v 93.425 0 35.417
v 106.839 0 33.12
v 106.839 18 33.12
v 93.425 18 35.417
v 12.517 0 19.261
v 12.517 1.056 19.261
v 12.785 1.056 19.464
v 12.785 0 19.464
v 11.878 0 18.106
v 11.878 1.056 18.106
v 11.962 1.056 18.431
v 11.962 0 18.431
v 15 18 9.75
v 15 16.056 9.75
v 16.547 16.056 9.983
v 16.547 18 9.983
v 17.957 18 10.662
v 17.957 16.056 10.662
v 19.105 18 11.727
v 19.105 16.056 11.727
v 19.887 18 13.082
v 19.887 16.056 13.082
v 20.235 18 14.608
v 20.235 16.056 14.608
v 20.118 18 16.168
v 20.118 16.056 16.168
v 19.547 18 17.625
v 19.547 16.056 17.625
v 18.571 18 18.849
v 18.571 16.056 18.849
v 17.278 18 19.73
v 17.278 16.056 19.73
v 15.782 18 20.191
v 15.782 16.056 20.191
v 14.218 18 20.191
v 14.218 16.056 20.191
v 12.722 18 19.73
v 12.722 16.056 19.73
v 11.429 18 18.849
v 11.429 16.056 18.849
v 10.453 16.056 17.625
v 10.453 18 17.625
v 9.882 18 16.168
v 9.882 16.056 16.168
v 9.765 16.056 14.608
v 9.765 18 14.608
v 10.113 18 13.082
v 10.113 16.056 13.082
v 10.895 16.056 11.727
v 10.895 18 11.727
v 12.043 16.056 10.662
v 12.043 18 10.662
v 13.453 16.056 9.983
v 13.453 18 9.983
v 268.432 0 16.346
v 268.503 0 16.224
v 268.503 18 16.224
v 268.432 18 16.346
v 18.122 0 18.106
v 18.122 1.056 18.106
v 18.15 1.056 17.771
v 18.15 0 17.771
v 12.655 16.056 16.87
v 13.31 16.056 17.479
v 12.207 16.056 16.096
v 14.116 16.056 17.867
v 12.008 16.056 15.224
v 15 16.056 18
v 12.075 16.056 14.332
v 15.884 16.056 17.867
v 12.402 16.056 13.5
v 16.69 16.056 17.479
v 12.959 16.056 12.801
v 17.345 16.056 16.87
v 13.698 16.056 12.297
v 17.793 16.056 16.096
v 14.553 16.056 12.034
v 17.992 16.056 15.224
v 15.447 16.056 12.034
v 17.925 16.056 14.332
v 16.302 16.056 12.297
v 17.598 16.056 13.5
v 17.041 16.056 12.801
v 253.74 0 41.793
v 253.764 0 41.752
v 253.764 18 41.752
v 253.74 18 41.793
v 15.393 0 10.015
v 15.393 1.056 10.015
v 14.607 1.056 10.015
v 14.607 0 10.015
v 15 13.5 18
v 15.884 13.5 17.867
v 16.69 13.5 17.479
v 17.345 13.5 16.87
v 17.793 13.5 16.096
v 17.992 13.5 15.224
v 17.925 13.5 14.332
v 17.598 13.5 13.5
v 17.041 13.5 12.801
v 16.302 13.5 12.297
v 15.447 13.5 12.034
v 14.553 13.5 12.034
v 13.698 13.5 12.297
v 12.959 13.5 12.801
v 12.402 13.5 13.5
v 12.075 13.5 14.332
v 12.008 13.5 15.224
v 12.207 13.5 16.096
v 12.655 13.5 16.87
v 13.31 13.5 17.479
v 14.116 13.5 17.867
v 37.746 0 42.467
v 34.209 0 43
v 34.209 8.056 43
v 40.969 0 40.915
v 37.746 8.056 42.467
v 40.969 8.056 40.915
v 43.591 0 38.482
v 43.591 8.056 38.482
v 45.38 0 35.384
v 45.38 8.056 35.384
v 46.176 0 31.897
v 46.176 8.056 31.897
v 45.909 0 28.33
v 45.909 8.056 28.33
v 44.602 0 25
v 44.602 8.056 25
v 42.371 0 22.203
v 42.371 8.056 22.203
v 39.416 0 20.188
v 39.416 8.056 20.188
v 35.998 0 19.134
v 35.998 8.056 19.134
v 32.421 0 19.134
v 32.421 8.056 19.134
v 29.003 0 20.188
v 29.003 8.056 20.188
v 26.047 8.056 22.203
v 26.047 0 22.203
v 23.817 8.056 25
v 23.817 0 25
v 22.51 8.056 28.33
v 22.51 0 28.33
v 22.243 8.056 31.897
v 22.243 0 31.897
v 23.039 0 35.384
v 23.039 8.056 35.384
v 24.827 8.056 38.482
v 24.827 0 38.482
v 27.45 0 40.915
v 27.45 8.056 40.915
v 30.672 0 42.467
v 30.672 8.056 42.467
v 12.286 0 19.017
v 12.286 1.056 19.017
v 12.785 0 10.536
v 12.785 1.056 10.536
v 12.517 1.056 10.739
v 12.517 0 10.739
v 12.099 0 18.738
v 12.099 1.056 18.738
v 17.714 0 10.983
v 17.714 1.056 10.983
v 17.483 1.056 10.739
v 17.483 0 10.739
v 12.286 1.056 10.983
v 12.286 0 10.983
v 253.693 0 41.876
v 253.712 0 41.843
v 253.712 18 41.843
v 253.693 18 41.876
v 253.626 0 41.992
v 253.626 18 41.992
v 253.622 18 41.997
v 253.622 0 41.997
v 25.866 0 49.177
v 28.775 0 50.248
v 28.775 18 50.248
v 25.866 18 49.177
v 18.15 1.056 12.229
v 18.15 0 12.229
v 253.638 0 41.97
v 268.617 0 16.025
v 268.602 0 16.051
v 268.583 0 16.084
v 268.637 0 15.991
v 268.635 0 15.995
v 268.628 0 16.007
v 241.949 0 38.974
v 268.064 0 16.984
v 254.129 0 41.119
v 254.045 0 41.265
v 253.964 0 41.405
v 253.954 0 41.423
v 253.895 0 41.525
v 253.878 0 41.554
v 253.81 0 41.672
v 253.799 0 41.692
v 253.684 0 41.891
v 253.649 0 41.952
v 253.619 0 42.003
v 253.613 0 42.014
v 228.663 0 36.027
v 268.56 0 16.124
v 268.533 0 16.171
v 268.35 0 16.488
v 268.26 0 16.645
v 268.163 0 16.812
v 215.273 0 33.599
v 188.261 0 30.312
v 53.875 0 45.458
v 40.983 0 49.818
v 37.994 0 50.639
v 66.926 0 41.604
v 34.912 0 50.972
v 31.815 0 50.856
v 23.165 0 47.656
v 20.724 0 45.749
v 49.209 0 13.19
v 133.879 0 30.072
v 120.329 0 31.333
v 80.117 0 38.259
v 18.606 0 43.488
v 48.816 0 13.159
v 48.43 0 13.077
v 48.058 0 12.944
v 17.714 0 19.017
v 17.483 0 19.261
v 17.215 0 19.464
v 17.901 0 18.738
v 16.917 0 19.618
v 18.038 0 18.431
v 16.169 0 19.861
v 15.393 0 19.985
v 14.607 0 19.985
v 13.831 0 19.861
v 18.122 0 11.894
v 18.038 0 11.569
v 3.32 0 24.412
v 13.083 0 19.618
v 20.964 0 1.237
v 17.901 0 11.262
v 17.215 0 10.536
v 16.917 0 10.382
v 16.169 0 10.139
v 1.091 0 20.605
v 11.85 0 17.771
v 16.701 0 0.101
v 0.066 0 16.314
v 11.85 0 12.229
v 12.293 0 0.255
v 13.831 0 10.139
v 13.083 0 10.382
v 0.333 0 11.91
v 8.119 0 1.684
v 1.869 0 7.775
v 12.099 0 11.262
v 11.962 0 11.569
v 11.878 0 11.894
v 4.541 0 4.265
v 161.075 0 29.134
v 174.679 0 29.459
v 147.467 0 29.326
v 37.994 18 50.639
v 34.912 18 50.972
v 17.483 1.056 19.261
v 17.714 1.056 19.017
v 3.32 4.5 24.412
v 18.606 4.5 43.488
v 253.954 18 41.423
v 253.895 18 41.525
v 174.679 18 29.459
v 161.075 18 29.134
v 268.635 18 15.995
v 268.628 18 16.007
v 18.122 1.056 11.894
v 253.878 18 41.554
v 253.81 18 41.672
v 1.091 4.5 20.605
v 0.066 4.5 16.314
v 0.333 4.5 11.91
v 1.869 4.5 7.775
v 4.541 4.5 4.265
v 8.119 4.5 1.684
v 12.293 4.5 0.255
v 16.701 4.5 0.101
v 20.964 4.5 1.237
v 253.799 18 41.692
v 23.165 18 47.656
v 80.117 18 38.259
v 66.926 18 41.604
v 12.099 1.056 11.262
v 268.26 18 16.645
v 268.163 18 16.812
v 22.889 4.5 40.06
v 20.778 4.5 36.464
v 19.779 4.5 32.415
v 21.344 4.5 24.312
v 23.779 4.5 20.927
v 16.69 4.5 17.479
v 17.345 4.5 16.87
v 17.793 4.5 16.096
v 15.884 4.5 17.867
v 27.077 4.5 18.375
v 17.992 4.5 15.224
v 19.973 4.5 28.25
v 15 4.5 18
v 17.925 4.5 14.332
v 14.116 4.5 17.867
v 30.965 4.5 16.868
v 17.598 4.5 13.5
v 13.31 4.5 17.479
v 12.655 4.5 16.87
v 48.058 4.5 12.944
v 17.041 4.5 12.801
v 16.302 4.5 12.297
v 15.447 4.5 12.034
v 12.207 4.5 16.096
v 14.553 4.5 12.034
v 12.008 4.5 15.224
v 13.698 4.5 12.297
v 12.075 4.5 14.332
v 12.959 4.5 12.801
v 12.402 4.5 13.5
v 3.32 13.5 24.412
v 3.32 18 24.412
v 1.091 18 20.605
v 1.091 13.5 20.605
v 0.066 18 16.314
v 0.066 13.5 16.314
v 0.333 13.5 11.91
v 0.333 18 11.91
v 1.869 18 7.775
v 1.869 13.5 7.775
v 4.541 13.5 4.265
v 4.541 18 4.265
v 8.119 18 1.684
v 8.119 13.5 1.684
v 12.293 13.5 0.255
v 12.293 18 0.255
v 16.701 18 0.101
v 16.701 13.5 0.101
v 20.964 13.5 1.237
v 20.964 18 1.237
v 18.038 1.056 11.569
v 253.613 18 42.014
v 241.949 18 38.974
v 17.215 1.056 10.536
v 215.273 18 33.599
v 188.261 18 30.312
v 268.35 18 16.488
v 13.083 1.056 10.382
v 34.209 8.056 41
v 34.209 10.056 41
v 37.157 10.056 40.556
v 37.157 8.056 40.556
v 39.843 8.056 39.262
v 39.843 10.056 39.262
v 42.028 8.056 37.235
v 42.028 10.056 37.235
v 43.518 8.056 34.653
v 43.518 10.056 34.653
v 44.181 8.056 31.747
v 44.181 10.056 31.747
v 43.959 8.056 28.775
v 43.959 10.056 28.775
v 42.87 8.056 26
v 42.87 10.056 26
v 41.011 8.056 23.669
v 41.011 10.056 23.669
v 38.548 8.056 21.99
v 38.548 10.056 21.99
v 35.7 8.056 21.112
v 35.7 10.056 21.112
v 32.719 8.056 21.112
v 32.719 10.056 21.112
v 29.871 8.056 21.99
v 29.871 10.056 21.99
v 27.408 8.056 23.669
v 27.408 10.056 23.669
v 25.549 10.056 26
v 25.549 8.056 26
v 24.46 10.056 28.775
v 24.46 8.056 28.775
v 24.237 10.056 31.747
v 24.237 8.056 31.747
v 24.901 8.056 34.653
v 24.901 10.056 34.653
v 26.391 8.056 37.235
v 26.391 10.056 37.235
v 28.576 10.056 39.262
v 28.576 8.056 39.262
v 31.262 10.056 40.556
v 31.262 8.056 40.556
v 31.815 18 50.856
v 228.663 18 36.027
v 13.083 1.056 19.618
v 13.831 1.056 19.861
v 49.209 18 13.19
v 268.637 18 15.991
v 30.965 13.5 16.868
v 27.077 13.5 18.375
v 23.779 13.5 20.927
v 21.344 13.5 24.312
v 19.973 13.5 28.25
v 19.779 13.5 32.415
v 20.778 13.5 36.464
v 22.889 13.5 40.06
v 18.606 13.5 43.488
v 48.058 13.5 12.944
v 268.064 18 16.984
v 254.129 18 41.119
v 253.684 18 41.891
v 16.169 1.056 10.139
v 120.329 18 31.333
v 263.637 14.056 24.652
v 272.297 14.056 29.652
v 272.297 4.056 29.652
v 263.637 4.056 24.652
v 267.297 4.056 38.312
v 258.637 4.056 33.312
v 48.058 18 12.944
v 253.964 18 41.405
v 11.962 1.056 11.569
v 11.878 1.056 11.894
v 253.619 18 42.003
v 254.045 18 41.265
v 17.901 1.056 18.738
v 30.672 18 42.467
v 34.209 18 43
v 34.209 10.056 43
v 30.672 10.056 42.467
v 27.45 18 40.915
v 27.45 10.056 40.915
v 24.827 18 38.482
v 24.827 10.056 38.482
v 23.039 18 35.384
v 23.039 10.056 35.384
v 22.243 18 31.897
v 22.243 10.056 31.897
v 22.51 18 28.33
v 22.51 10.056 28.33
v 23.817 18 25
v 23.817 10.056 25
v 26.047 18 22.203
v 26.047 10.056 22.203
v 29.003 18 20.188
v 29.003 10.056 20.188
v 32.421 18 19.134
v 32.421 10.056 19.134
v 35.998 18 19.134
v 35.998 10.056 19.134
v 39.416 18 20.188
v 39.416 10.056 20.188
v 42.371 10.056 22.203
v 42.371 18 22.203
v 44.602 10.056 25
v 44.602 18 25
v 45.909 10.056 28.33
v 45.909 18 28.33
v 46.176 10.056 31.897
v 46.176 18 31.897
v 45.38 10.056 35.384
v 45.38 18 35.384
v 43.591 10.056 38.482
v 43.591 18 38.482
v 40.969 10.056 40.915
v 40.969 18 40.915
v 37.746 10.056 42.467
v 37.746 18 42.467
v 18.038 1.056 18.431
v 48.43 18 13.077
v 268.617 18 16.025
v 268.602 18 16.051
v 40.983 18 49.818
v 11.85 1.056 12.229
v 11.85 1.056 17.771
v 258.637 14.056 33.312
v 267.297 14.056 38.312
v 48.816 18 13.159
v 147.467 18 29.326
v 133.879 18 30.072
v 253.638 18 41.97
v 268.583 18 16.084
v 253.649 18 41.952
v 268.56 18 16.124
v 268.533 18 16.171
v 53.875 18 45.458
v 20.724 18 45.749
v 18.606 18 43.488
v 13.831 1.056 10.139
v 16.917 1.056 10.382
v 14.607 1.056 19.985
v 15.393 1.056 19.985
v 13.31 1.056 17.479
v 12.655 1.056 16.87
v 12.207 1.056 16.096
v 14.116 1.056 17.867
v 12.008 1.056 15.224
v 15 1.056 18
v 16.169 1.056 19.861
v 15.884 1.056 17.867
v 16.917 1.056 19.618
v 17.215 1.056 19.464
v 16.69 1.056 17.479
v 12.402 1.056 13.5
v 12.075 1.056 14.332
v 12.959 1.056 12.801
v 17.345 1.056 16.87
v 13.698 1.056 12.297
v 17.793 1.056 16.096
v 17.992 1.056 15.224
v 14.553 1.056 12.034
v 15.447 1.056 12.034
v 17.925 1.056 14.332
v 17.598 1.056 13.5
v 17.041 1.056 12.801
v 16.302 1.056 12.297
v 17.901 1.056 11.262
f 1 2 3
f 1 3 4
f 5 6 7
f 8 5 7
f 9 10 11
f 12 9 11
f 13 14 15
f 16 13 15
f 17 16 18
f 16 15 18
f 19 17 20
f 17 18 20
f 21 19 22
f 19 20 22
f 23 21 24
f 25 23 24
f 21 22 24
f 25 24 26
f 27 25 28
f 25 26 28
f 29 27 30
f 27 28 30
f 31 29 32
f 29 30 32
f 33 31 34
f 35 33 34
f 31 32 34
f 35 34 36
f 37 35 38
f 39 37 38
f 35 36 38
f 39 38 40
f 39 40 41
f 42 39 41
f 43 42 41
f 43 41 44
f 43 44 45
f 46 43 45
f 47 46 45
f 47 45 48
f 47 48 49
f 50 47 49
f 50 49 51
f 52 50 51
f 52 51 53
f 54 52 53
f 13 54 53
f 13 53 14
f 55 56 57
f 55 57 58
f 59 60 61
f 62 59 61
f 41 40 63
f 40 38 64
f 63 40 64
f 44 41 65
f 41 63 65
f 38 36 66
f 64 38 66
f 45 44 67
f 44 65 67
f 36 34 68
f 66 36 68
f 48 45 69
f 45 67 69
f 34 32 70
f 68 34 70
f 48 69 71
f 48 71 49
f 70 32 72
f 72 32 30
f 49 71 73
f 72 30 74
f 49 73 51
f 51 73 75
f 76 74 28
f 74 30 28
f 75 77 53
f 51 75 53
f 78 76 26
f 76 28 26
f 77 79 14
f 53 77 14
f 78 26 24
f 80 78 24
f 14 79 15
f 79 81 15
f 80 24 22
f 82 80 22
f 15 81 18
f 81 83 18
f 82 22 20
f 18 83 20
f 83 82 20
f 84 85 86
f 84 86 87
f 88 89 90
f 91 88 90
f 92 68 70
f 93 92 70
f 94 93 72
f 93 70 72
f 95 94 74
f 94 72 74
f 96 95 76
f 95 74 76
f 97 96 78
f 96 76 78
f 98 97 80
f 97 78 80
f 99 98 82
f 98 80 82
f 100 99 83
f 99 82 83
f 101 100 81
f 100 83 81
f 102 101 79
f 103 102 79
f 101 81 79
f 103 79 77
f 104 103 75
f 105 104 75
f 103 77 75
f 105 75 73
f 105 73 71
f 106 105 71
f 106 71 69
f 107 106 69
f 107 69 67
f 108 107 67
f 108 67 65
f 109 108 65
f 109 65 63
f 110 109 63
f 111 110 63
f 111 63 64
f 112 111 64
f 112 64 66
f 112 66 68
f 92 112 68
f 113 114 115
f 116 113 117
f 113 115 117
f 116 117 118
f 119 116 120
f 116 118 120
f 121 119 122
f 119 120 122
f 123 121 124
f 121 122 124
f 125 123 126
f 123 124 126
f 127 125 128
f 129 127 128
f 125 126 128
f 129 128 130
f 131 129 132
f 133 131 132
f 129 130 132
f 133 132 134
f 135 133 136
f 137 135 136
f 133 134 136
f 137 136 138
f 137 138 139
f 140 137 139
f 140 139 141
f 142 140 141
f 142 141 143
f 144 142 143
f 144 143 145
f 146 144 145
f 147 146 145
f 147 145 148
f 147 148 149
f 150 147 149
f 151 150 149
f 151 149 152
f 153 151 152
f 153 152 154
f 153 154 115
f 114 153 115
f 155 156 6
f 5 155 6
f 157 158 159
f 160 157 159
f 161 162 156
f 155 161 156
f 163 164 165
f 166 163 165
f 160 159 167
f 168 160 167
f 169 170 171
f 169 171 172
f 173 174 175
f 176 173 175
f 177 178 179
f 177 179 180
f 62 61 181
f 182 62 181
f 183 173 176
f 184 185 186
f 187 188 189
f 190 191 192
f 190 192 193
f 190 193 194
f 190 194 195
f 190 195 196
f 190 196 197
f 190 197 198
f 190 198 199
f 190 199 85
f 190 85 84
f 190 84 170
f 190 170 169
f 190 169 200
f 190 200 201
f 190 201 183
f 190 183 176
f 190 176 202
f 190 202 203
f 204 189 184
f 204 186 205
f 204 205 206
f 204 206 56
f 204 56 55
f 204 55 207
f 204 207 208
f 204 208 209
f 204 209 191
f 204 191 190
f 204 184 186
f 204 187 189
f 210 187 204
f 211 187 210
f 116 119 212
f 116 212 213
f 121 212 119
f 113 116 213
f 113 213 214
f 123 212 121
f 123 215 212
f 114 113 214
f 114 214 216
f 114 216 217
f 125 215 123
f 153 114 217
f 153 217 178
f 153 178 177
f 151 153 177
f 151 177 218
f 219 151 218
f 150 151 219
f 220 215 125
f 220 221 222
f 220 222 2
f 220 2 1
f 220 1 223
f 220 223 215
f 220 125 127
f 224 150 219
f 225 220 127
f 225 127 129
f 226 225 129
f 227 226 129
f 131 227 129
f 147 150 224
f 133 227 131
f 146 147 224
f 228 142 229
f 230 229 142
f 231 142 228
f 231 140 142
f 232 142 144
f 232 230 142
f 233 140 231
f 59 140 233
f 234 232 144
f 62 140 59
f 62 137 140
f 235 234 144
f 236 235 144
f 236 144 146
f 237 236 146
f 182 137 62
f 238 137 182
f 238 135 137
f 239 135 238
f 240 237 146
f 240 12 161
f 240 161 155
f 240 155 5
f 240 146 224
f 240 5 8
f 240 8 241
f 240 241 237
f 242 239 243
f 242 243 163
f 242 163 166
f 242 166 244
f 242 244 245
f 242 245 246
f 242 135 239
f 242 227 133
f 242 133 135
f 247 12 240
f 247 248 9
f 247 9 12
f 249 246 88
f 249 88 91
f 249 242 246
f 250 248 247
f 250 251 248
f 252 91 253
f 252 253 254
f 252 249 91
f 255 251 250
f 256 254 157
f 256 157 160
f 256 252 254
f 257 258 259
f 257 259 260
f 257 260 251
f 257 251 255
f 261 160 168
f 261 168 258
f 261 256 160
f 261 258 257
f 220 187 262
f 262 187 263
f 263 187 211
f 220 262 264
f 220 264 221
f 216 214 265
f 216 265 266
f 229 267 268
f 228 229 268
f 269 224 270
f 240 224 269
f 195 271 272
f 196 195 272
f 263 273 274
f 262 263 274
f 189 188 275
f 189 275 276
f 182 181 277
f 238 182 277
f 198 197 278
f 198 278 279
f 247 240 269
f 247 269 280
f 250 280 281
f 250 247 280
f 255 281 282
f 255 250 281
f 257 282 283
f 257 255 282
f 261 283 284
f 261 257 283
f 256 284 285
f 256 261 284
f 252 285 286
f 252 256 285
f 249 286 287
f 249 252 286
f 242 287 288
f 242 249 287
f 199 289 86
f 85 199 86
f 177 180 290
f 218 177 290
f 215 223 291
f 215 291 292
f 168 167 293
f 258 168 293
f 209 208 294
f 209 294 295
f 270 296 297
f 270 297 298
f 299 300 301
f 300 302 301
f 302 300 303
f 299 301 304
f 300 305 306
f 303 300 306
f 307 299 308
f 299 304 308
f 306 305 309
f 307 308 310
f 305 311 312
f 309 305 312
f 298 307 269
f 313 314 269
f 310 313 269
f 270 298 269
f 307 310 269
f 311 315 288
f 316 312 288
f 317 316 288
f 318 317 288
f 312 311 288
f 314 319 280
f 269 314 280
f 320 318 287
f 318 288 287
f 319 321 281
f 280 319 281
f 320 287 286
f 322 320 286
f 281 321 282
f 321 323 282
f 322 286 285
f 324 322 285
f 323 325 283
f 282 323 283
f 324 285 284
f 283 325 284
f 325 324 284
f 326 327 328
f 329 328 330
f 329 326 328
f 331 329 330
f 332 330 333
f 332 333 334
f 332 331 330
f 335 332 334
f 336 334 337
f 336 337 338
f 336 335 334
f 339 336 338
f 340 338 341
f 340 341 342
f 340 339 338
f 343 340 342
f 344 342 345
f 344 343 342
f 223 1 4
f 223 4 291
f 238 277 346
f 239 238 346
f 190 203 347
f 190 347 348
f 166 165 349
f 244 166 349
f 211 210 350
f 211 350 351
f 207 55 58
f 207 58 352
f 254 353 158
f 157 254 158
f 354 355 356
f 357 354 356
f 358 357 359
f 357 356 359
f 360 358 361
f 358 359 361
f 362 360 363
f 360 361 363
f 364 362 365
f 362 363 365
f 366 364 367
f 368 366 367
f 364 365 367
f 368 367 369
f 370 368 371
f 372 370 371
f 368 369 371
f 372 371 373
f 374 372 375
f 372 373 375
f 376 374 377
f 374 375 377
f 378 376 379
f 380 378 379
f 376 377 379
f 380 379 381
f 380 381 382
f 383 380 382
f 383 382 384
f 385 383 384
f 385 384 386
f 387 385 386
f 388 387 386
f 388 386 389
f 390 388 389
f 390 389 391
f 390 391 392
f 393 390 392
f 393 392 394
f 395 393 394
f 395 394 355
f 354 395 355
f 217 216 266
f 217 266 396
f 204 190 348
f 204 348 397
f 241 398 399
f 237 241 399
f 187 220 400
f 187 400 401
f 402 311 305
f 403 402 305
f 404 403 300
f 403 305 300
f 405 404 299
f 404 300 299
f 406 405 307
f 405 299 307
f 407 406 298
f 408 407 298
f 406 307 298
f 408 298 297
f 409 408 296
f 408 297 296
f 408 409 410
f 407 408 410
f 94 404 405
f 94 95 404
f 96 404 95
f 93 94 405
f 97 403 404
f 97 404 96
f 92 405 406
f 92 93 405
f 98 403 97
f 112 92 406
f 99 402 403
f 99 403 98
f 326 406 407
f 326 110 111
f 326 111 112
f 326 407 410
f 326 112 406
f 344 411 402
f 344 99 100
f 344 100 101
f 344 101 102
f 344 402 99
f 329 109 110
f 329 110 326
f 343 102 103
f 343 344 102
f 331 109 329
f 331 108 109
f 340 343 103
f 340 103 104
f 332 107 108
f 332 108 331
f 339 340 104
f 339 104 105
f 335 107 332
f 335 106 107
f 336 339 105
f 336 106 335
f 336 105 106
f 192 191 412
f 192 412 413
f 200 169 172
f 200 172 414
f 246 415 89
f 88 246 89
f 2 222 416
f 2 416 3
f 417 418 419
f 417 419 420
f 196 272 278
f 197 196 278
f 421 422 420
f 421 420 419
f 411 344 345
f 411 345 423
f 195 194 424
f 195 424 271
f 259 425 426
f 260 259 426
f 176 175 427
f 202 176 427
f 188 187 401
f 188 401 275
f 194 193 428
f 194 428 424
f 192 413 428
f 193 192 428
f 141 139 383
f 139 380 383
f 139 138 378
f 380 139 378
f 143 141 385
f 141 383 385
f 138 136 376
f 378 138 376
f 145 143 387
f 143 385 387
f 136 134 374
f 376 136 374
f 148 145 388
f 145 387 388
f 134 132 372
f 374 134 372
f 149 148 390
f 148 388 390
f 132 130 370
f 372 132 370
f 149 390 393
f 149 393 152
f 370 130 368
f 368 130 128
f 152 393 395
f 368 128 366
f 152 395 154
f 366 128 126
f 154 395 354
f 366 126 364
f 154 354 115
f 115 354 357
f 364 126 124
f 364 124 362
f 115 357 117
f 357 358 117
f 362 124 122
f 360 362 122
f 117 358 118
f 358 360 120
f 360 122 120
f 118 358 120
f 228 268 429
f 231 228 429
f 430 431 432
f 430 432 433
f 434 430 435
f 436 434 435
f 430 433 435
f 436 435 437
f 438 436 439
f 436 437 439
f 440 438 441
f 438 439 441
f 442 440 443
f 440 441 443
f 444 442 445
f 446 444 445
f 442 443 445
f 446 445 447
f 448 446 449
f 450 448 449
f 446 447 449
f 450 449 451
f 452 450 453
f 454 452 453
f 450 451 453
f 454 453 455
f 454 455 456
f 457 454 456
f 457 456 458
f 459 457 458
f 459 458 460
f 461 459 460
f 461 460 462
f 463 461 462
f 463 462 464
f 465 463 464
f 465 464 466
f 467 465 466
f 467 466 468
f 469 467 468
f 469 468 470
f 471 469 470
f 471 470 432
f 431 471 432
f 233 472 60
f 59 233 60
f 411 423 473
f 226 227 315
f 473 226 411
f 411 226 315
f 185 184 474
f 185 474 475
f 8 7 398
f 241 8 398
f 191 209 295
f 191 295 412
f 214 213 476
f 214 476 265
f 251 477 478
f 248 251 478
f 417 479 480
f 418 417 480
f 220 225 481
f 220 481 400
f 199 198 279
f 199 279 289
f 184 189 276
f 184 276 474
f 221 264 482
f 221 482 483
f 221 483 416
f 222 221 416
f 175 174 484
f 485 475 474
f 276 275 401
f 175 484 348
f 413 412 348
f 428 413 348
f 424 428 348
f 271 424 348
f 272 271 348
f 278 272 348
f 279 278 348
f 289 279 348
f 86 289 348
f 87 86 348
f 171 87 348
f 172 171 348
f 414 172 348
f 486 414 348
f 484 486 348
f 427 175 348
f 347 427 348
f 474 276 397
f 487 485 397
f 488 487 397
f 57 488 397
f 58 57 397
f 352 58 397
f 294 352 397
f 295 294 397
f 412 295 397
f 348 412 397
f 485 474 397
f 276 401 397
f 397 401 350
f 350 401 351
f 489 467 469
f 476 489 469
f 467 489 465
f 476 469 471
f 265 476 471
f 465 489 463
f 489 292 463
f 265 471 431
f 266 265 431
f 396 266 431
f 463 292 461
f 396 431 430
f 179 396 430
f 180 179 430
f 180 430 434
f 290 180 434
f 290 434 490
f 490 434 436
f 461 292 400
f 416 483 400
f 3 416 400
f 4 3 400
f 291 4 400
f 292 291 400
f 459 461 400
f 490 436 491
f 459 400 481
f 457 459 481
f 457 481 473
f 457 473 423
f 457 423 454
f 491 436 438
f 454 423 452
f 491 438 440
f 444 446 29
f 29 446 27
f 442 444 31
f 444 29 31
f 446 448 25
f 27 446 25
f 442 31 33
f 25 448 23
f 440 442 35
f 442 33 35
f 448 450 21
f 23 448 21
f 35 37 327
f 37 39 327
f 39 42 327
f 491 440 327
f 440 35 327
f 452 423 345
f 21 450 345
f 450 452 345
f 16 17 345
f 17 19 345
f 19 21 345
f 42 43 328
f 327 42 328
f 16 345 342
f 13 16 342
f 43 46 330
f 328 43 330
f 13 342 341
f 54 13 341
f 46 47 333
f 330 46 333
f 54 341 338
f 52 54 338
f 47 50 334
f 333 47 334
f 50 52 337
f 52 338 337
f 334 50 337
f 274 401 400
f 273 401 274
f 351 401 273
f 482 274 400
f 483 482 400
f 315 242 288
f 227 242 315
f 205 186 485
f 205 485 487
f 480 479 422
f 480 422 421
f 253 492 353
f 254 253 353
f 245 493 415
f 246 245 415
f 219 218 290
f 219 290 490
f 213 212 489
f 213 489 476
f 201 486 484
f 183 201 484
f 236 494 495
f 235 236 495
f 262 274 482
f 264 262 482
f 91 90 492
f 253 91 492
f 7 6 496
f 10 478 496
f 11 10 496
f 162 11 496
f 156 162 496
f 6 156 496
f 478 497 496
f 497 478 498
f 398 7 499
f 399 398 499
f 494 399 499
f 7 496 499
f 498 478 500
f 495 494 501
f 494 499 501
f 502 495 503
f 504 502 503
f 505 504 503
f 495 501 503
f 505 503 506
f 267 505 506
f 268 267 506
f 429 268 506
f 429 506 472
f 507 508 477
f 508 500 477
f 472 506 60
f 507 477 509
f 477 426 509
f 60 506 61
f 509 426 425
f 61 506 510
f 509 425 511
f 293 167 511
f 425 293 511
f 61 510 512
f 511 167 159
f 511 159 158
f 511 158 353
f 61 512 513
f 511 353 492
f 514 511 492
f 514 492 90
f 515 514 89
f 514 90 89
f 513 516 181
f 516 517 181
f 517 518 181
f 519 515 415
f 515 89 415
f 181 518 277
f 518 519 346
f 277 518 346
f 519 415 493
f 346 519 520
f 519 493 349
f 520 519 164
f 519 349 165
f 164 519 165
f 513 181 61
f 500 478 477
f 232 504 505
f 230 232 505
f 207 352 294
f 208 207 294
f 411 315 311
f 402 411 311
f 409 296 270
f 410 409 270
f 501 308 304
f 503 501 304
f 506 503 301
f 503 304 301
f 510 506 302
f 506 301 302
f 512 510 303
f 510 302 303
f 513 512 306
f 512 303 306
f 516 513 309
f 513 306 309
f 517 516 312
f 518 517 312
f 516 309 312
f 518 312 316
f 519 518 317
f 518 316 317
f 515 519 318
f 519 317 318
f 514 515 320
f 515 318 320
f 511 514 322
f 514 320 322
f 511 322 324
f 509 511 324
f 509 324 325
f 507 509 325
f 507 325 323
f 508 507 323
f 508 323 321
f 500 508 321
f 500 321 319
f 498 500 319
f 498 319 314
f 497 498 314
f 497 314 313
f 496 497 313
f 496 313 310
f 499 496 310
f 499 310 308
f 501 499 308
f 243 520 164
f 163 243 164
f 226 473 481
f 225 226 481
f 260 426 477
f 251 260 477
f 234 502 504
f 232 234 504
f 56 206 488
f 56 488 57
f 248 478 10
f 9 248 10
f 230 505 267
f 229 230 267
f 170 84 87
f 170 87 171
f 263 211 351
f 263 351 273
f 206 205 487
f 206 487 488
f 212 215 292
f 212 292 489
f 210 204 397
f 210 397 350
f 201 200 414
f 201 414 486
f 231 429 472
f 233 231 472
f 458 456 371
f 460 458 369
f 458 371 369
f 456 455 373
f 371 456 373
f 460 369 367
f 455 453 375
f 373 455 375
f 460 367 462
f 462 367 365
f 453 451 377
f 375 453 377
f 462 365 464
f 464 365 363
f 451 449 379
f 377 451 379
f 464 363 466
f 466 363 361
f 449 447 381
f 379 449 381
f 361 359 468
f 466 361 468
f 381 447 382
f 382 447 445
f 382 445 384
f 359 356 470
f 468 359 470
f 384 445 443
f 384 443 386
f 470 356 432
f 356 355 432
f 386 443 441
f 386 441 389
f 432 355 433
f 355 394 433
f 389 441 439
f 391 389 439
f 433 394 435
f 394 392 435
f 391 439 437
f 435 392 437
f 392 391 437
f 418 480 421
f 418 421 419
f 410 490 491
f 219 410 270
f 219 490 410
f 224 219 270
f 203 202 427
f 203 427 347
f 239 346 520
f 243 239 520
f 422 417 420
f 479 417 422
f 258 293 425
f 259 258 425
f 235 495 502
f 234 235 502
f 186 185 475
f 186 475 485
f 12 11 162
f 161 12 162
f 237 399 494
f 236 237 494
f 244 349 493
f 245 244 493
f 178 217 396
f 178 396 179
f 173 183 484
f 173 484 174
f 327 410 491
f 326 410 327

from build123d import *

# Parameters (mm, degrees)
EXTRUDE_2_DEPTH     = 18
EXTRUDE_3_DEPTH     = 18
CUT_EXTRUDE_1_DEPTH = 274.954545633
CUT_EXTRUDE_START   = 4.5
CUT_EXTRUDE_8_DEPTH = 9
SKETCH_12_R         = 3.000000492
CUT_EXTRUDE_2_DEPTH = 274.760361364
SKETCH_19_R         = 5.250000395
CUT_EXTRUDE_3_DEPTH = 274.901063636
SKETCH_28_R         = 12.000002389
CUT_EXTRUDE_5_DEPTH = 274.610814509
SKETCH_37_R         = 9.999999776
CUT_EXTRUDE_6_DEPTH = 274.614911801
SKETCH_47_R         = 12.000000104
CUT_EXTRUDE_7_DEPTH = 274.614911801
EXTRUDE_4_DEPTH     = 10
SKETCH_51_R         = 3.000000989
CUT_EXTRUDE_9_DEPTH = 5


with BuildPart() as part:
    # Эскиз49 → Бобышка-Вытянуть2 (new body)
    with BuildSketch(Plane(origin=(0, 0, 0), x_dir=(1, 0, 0), z_dir=(0, 1, 0))):
        with BuildLine():
            Line((268.063783646, -16.98423177), (254.129260778, -41.119493544))
            Line((254.129260778, -41.119493544), (254.045069218, -41.265372187))
            Line((254.045069218, -41.265372187), (253.964364529, -41.405163705))
            Line((253.964364529, -41.405163705), (253.954172134, -41.422776878))
            Line((253.954172134, -41.422776878), (253.894984722, -41.525326669))
            Line((253.894984722, -41.525326669), (253.878325224, -41.554179043))
            Line((253.878325224, -41.554179043), (253.81013751, -41.672233492))
            Line((253.81013751, -41.672233492), (253.79884243, -41.691847146))
            Line((253.79884243, -41.691847146), (253.764301538, -41.751608253))
            Line((253.764301538, -41.751608253), (253.740429878, -41.792999953))
            Line((253.740429878, -41.792999953), (253.711700439, -41.842740029))
            Line((253.711700439, -41.842740029), (253.692567348, -41.875883937))
            Line((253.692567348, -41.875883937), (253.683686256, -41.891265661))
            Line((253.683686256, -41.891265661), (253.64869833, -41.951872408))
            Line((253.64869833, -41.951872408), (253.638356924, -41.969776154))
            Line((253.638356924, -41.969776154), (253.625631332, -41.991844773))
            Line((253.625631332, -41.991844773), (253.622353077, -41.997496039))
            Line((253.622353077, -41.997496039), (253.619432449, -42.002540082))
            Line((253.619432449, -42.002540082), (253.613084555, -42.01355204))
            Line((253.613084555, -42.01355204), (241.948843002, -38.973722607))
            Line((241.948843002, -38.973722607), (228.663310409, -36.026842892))
            Line((228.663310409, -36.026842892), (215.273305774, -33.598650247))
            Line((215.273305774, -33.598650247), (188.260793686, -30.312221497))
            Line((188.260793686, -30.312221497), (174.679160118, -29.458951205))
            Line((174.679160118, -29.458951205), (161.074608564, -29.134295881))
            Line((161.074608564, -29.134295881), (147.467300296, -29.326442629))
            Line((147.467300296, -29.326442629), (133.879095316, -30.07199429))
            Line((133.879095316, -30.07199429), (120.329216123, -31.332932413))
            Line((120.329216123, -31.332932413), (106.838598847, -33.11965242))
            Line((106.838598847, -33.11965242), (93.425318599, -35.417359322))
            Line((93.425318599, -35.417359322), (80.116614699, -38.258839399))
            Line((80.116614699, -38.258839399), (66.925637424, -41.603542864))
            Line((66.925637424, -41.603542864), (53.874649107, -45.458499342))
            Line((53.874649107, -45.458499342), (40.983382612, -49.817882478))
            Line((40.983382612, -49.817882478), (37.993647158, -50.638716668))
            Line((37.993647158, -50.638716668), (34.912444651, -50.972435623))
            Line((34.912444651, -50.972435623), (31.815398484, -50.856206566))
            Line((31.815398484, -50.856206566), (28.775347397, -50.247631967))
            Line((28.775347397, -50.247631967), (25.86587891, -49.176525325))
            Line((25.86587891, -49.176525325), (23.165307939, -47.655962408))
            Line((23.165307939, -47.655962408), (20.723795518, -45.748956501))
            Line((20.723795518, -45.748956501), (18.606347963, -43.487519026))
            Line((18.606347963, -43.487519026), (22.888580337, -40.060333908))
            ThreePointArc((22.888580337, -40.060333908), (20.515961233, -26.231308511), (30.96540831, -16.867531464))
            Line((30.96540831, -16.867531464), (48.057679087, -12.944173068))
            Line((48.057679087, -12.944173068), (48.429638147, -13.076597825))
            Line((48.429638147, -13.076597825), (48.815764487, -13.159029186))
            Line((48.815764487, -13.159029186), (49.209374934, -13.19003664))
            Line((49.209374934, -13.19003664), (268.63694191, -15.991469845))
            Line((268.63694191, -15.991469845), (268.63476634, -15.995245427))
            Line((268.63476634, -15.995245427), (268.628239632, -16.006551683))
            Line((268.628239632, -16.006551683), (268.617421389, -16.025297344))
            Line((268.617421389, -16.025297344), (268.602401018, -16.051340848))
            Line((268.602401018, -16.051340848), (268.583238125, -16.084482893))
            Line((268.583238125, -16.084482893), (268.560141325, -16.124473885))
            Line((268.560141325, -16.124473885), (268.533289433, -16.171008348))
            Line((268.533289433, -16.171008348), (268.502831459, -16.223732382))
            Line((268.502831459, -16.223732382), (268.432199955, -16.34609513))
            Line((268.432199955, -16.34609513), (268.350362778, -16.487849876))
            Line((268.350362778, -16.487849876), (268.259823322, -16.644688323))
            Line((268.259823322, -16.644688323), (268.1632936, -16.811842099))
            Line((268.1632936, -16.811842099), (268.063783646, -16.98423177))
        make_face()
    extrude(amount=EXTRUDE_2_DEPTH)

    # Эскиз50 → Бобышка-Вытянуть3 (add)
    with BuildSketch(Plane(origin=(0, 0, 0), x_dir=(1, 0, 0), z_dir=(0, 1, 0))):
        with BuildLine():
            Line((18.606347963, -43.487519026), (3.320188681, -24.411882))
            ThreePointArc((3.320188681, -24.411882), (3.075097683, -5.921043708), (20.964451369, -1.236794031))
            Line((20.964451369, -1.236794031), (48.057679087, -12.944173068))
            Line((48.057679087, -12.944173068), (30.96540831, -16.867531464))
            ThreePointArc((30.96540831, -16.867531464), (20.515961233, -26.231308511), (22.888580337, -40.060333908))
            Line((22.888580337, -40.060333908), (18.606347963, -43.487519026))
        make_face()
    extrude(amount=EXTRUDE_3_DEPTH)

    # Эскиз6 → Вырез-Вытянуть1 (cut, through all)
    with BuildSketch(Plane(origin=(0, 1.056053559, 0), x_dir=(1, 0, 0), z_dir=(0, 1, 0))):
        Polygon((12.516560033, -19.261443987), (12.784916908, -19.463635981), (13.083335012, -19.618049264), (13.830723241, -19.861357287), (14.607004821, -19.984532148), (15.392998233, -19.984532148), (16.169279814, -19.861357287), (16.916668043, -19.618049264), (17.215086147, -19.463635981), (17.483444884, -19.261443987), (17.714165151, -19.017178565), (17.900740728, -18.737738952), (18.037900329, -18.431009725), (18.121777102, -18.105644733), (18.150001764, -17.770830542), (18.150001764, -12.229168788), (18.121777102, -11.894354597), (18.037900329, -11.568991467), (17.900740728, -11.262258515), (17.714165151, -10.982818902), (17.483444884, -10.738555342), (17.215086147, -10.536363348), (16.916668043, -10.381950065), (16.169279814, -10.138643906), (15.392998233, -10.015467182), (14.607004821, -10.015467182), (13.830723241, -10.138643906), (13.083335012, -10.381950065), (12.784916908, -10.536363348), (12.516560033, -10.738555342), (12.285837904, -10.982818902), (12.099262327, -11.262258515), (11.962102726, -11.568991467), (11.878225952, -11.894354597), (11.85000129, -12.229168788), (11.85000129, -17.770830542), (11.878225952, -18.105644733), (11.962102726, -18.431009725), (12.099262327, -18.737738952), (12.285837904, -19.017178565), align=None)
    extrude(amount=-CUT_EXTRUDE_1_DEPTH, mode=Mode.SUBTRACT)

    # Эскиз50<3> → Вырез-Вытянуть8 (cut)
    with BuildSketch(Plane(origin=(0, 0, 0), x_dir=(1, 0, 0), z_dir=(0, 1, 0)).offset(CUT_EXTRUDE_START)):
        with BuildLine():
            Line((18.606347963, -43.487519026), (3.320188681, -24.411882))
            ThreePointArc((3.320188681, -24.411882), (3.075097683, -5.921043708), (20.964451369, -1.236794031))
            Line((20.964451369, -1.236794031), (48.057679087, -12.944173068))
            Line((48.057679087, -12.944173068), (30.96540831, -16.867531464))
            ThreePointArc((30.96540831, -16.867531464), (20.515961233, -26.231308511), (22.888580337, -40.060333908))
            Line((22.888580337, -40.060333908), (18.606347963, -43.487519026))
        make_face()
    extrude(amount=CUT_EXTRUDE_8_DEPTH, mode=Mode.SUBTRACT)

    # Эскиз12 → Вырез-Вытянуть2 (cut, through all)
    with BuildSketch(Plane(origin=(0, 4.556053318, 0), x_dir=(1, 0, 0), z_dir=(0, 1, 0))):
        with Locations((15.000002459, -14.999998733)):
            Circle(SKETCH_12_R)
    extrude(amount=-CUT_EXTRUDE_2_DEPTH, mode=Mode.SUBTRACT)

    # Эскиз19 → Вырез-Вытянуть3 (cut, through all)
    with BuildSketch(Plane(origin=(0, 16.056055203, 0), x_dir=(-1, 0, 0), z_dir=(0, -1, 0))):
        with Locations((-15.000000345, -14.999999665)):
            Circle(SKETCH_19_R)
    extrude(amount=-CUT_EXTRUDE_3_DEPTH, mode=Mode.SUBTRACT)

    # Эскиз28 → Вырез-Вытянуть5 (cut, through all)
    with BuildSketch(Plane(origin=(0, 8.056053892, 0), x_dir=(1, 0, 0), z_dir=(0, 1, 0))):
        with Locations((34.209375704, -31.000001441)):
            Circle(SKETCH_28_R)
    extrude(amount=-CUT_EXTRUDE_5_DEPTH, mode=Mode.SUBTRACT)

    # Эскиз37 → Вырез-Вытянуть6 (cut, through all)
    with BuildSketch(Plane(origin=(0, 10.056053288, 0), x_dir=(1, 0, 0), z_dir=(0, 1, 0))):
        with Locations((34.209374338, -30.999999493)):
            Circle(SKETCH_37_R)
    extrude(amount=-CUT_EXTRUDE_6_DEPTH, mode=Mode.SUBTRACT)

    # Эскиз47 → Вырез-Вытянуть7 (cut, through all)
    with BuildSketch(Plane(origin=(0, 10.056053288, 0), x_dir=(-1, 0, 0), z_dir=(0, -1, 0))):
        with Locations((-34.209374338, -30.999999493)):
            Circle(SKETCH_47_R)
    extrude(amount=-CUT_EXTRUDE_7_DEPTH, mode=Mode.SUBTRACT)

    # Эскиз51 → Вырез-Вытянуть9 (cut)
    with BuildSketch(Plane(origin=(0, 16.056055203, 0), x_dir=(1, 0, 0), z_dir=(0, 1, 0))):
        with Locations((15.000000345, -14.999999665)):
            Circle(SKETCH_51_R)
    extrude(amount=-CUT_EXTRUDE_9_DEPTH, mode=Mode.SUBTRACT)


with BuildPart() as body_2:
    # Эскиз1 → Бобышка-Вытянуть4 (new body)
    with BuildSketch(Plane(origin=(0, 14.056053944, 0), x_dir=(1, 0, 0), z_dir=(0, 1, 0))):
        Polygon((263.636956116, -24.651711225), (258.636951447, -33.311977983), (267.297208309, -38.311976939), (272.297212979, -29.651710182), align=None)
    extrude(amount=-EXTRUDE_4_DEPTH)


solid = Compound([part.part, body_2.part])
